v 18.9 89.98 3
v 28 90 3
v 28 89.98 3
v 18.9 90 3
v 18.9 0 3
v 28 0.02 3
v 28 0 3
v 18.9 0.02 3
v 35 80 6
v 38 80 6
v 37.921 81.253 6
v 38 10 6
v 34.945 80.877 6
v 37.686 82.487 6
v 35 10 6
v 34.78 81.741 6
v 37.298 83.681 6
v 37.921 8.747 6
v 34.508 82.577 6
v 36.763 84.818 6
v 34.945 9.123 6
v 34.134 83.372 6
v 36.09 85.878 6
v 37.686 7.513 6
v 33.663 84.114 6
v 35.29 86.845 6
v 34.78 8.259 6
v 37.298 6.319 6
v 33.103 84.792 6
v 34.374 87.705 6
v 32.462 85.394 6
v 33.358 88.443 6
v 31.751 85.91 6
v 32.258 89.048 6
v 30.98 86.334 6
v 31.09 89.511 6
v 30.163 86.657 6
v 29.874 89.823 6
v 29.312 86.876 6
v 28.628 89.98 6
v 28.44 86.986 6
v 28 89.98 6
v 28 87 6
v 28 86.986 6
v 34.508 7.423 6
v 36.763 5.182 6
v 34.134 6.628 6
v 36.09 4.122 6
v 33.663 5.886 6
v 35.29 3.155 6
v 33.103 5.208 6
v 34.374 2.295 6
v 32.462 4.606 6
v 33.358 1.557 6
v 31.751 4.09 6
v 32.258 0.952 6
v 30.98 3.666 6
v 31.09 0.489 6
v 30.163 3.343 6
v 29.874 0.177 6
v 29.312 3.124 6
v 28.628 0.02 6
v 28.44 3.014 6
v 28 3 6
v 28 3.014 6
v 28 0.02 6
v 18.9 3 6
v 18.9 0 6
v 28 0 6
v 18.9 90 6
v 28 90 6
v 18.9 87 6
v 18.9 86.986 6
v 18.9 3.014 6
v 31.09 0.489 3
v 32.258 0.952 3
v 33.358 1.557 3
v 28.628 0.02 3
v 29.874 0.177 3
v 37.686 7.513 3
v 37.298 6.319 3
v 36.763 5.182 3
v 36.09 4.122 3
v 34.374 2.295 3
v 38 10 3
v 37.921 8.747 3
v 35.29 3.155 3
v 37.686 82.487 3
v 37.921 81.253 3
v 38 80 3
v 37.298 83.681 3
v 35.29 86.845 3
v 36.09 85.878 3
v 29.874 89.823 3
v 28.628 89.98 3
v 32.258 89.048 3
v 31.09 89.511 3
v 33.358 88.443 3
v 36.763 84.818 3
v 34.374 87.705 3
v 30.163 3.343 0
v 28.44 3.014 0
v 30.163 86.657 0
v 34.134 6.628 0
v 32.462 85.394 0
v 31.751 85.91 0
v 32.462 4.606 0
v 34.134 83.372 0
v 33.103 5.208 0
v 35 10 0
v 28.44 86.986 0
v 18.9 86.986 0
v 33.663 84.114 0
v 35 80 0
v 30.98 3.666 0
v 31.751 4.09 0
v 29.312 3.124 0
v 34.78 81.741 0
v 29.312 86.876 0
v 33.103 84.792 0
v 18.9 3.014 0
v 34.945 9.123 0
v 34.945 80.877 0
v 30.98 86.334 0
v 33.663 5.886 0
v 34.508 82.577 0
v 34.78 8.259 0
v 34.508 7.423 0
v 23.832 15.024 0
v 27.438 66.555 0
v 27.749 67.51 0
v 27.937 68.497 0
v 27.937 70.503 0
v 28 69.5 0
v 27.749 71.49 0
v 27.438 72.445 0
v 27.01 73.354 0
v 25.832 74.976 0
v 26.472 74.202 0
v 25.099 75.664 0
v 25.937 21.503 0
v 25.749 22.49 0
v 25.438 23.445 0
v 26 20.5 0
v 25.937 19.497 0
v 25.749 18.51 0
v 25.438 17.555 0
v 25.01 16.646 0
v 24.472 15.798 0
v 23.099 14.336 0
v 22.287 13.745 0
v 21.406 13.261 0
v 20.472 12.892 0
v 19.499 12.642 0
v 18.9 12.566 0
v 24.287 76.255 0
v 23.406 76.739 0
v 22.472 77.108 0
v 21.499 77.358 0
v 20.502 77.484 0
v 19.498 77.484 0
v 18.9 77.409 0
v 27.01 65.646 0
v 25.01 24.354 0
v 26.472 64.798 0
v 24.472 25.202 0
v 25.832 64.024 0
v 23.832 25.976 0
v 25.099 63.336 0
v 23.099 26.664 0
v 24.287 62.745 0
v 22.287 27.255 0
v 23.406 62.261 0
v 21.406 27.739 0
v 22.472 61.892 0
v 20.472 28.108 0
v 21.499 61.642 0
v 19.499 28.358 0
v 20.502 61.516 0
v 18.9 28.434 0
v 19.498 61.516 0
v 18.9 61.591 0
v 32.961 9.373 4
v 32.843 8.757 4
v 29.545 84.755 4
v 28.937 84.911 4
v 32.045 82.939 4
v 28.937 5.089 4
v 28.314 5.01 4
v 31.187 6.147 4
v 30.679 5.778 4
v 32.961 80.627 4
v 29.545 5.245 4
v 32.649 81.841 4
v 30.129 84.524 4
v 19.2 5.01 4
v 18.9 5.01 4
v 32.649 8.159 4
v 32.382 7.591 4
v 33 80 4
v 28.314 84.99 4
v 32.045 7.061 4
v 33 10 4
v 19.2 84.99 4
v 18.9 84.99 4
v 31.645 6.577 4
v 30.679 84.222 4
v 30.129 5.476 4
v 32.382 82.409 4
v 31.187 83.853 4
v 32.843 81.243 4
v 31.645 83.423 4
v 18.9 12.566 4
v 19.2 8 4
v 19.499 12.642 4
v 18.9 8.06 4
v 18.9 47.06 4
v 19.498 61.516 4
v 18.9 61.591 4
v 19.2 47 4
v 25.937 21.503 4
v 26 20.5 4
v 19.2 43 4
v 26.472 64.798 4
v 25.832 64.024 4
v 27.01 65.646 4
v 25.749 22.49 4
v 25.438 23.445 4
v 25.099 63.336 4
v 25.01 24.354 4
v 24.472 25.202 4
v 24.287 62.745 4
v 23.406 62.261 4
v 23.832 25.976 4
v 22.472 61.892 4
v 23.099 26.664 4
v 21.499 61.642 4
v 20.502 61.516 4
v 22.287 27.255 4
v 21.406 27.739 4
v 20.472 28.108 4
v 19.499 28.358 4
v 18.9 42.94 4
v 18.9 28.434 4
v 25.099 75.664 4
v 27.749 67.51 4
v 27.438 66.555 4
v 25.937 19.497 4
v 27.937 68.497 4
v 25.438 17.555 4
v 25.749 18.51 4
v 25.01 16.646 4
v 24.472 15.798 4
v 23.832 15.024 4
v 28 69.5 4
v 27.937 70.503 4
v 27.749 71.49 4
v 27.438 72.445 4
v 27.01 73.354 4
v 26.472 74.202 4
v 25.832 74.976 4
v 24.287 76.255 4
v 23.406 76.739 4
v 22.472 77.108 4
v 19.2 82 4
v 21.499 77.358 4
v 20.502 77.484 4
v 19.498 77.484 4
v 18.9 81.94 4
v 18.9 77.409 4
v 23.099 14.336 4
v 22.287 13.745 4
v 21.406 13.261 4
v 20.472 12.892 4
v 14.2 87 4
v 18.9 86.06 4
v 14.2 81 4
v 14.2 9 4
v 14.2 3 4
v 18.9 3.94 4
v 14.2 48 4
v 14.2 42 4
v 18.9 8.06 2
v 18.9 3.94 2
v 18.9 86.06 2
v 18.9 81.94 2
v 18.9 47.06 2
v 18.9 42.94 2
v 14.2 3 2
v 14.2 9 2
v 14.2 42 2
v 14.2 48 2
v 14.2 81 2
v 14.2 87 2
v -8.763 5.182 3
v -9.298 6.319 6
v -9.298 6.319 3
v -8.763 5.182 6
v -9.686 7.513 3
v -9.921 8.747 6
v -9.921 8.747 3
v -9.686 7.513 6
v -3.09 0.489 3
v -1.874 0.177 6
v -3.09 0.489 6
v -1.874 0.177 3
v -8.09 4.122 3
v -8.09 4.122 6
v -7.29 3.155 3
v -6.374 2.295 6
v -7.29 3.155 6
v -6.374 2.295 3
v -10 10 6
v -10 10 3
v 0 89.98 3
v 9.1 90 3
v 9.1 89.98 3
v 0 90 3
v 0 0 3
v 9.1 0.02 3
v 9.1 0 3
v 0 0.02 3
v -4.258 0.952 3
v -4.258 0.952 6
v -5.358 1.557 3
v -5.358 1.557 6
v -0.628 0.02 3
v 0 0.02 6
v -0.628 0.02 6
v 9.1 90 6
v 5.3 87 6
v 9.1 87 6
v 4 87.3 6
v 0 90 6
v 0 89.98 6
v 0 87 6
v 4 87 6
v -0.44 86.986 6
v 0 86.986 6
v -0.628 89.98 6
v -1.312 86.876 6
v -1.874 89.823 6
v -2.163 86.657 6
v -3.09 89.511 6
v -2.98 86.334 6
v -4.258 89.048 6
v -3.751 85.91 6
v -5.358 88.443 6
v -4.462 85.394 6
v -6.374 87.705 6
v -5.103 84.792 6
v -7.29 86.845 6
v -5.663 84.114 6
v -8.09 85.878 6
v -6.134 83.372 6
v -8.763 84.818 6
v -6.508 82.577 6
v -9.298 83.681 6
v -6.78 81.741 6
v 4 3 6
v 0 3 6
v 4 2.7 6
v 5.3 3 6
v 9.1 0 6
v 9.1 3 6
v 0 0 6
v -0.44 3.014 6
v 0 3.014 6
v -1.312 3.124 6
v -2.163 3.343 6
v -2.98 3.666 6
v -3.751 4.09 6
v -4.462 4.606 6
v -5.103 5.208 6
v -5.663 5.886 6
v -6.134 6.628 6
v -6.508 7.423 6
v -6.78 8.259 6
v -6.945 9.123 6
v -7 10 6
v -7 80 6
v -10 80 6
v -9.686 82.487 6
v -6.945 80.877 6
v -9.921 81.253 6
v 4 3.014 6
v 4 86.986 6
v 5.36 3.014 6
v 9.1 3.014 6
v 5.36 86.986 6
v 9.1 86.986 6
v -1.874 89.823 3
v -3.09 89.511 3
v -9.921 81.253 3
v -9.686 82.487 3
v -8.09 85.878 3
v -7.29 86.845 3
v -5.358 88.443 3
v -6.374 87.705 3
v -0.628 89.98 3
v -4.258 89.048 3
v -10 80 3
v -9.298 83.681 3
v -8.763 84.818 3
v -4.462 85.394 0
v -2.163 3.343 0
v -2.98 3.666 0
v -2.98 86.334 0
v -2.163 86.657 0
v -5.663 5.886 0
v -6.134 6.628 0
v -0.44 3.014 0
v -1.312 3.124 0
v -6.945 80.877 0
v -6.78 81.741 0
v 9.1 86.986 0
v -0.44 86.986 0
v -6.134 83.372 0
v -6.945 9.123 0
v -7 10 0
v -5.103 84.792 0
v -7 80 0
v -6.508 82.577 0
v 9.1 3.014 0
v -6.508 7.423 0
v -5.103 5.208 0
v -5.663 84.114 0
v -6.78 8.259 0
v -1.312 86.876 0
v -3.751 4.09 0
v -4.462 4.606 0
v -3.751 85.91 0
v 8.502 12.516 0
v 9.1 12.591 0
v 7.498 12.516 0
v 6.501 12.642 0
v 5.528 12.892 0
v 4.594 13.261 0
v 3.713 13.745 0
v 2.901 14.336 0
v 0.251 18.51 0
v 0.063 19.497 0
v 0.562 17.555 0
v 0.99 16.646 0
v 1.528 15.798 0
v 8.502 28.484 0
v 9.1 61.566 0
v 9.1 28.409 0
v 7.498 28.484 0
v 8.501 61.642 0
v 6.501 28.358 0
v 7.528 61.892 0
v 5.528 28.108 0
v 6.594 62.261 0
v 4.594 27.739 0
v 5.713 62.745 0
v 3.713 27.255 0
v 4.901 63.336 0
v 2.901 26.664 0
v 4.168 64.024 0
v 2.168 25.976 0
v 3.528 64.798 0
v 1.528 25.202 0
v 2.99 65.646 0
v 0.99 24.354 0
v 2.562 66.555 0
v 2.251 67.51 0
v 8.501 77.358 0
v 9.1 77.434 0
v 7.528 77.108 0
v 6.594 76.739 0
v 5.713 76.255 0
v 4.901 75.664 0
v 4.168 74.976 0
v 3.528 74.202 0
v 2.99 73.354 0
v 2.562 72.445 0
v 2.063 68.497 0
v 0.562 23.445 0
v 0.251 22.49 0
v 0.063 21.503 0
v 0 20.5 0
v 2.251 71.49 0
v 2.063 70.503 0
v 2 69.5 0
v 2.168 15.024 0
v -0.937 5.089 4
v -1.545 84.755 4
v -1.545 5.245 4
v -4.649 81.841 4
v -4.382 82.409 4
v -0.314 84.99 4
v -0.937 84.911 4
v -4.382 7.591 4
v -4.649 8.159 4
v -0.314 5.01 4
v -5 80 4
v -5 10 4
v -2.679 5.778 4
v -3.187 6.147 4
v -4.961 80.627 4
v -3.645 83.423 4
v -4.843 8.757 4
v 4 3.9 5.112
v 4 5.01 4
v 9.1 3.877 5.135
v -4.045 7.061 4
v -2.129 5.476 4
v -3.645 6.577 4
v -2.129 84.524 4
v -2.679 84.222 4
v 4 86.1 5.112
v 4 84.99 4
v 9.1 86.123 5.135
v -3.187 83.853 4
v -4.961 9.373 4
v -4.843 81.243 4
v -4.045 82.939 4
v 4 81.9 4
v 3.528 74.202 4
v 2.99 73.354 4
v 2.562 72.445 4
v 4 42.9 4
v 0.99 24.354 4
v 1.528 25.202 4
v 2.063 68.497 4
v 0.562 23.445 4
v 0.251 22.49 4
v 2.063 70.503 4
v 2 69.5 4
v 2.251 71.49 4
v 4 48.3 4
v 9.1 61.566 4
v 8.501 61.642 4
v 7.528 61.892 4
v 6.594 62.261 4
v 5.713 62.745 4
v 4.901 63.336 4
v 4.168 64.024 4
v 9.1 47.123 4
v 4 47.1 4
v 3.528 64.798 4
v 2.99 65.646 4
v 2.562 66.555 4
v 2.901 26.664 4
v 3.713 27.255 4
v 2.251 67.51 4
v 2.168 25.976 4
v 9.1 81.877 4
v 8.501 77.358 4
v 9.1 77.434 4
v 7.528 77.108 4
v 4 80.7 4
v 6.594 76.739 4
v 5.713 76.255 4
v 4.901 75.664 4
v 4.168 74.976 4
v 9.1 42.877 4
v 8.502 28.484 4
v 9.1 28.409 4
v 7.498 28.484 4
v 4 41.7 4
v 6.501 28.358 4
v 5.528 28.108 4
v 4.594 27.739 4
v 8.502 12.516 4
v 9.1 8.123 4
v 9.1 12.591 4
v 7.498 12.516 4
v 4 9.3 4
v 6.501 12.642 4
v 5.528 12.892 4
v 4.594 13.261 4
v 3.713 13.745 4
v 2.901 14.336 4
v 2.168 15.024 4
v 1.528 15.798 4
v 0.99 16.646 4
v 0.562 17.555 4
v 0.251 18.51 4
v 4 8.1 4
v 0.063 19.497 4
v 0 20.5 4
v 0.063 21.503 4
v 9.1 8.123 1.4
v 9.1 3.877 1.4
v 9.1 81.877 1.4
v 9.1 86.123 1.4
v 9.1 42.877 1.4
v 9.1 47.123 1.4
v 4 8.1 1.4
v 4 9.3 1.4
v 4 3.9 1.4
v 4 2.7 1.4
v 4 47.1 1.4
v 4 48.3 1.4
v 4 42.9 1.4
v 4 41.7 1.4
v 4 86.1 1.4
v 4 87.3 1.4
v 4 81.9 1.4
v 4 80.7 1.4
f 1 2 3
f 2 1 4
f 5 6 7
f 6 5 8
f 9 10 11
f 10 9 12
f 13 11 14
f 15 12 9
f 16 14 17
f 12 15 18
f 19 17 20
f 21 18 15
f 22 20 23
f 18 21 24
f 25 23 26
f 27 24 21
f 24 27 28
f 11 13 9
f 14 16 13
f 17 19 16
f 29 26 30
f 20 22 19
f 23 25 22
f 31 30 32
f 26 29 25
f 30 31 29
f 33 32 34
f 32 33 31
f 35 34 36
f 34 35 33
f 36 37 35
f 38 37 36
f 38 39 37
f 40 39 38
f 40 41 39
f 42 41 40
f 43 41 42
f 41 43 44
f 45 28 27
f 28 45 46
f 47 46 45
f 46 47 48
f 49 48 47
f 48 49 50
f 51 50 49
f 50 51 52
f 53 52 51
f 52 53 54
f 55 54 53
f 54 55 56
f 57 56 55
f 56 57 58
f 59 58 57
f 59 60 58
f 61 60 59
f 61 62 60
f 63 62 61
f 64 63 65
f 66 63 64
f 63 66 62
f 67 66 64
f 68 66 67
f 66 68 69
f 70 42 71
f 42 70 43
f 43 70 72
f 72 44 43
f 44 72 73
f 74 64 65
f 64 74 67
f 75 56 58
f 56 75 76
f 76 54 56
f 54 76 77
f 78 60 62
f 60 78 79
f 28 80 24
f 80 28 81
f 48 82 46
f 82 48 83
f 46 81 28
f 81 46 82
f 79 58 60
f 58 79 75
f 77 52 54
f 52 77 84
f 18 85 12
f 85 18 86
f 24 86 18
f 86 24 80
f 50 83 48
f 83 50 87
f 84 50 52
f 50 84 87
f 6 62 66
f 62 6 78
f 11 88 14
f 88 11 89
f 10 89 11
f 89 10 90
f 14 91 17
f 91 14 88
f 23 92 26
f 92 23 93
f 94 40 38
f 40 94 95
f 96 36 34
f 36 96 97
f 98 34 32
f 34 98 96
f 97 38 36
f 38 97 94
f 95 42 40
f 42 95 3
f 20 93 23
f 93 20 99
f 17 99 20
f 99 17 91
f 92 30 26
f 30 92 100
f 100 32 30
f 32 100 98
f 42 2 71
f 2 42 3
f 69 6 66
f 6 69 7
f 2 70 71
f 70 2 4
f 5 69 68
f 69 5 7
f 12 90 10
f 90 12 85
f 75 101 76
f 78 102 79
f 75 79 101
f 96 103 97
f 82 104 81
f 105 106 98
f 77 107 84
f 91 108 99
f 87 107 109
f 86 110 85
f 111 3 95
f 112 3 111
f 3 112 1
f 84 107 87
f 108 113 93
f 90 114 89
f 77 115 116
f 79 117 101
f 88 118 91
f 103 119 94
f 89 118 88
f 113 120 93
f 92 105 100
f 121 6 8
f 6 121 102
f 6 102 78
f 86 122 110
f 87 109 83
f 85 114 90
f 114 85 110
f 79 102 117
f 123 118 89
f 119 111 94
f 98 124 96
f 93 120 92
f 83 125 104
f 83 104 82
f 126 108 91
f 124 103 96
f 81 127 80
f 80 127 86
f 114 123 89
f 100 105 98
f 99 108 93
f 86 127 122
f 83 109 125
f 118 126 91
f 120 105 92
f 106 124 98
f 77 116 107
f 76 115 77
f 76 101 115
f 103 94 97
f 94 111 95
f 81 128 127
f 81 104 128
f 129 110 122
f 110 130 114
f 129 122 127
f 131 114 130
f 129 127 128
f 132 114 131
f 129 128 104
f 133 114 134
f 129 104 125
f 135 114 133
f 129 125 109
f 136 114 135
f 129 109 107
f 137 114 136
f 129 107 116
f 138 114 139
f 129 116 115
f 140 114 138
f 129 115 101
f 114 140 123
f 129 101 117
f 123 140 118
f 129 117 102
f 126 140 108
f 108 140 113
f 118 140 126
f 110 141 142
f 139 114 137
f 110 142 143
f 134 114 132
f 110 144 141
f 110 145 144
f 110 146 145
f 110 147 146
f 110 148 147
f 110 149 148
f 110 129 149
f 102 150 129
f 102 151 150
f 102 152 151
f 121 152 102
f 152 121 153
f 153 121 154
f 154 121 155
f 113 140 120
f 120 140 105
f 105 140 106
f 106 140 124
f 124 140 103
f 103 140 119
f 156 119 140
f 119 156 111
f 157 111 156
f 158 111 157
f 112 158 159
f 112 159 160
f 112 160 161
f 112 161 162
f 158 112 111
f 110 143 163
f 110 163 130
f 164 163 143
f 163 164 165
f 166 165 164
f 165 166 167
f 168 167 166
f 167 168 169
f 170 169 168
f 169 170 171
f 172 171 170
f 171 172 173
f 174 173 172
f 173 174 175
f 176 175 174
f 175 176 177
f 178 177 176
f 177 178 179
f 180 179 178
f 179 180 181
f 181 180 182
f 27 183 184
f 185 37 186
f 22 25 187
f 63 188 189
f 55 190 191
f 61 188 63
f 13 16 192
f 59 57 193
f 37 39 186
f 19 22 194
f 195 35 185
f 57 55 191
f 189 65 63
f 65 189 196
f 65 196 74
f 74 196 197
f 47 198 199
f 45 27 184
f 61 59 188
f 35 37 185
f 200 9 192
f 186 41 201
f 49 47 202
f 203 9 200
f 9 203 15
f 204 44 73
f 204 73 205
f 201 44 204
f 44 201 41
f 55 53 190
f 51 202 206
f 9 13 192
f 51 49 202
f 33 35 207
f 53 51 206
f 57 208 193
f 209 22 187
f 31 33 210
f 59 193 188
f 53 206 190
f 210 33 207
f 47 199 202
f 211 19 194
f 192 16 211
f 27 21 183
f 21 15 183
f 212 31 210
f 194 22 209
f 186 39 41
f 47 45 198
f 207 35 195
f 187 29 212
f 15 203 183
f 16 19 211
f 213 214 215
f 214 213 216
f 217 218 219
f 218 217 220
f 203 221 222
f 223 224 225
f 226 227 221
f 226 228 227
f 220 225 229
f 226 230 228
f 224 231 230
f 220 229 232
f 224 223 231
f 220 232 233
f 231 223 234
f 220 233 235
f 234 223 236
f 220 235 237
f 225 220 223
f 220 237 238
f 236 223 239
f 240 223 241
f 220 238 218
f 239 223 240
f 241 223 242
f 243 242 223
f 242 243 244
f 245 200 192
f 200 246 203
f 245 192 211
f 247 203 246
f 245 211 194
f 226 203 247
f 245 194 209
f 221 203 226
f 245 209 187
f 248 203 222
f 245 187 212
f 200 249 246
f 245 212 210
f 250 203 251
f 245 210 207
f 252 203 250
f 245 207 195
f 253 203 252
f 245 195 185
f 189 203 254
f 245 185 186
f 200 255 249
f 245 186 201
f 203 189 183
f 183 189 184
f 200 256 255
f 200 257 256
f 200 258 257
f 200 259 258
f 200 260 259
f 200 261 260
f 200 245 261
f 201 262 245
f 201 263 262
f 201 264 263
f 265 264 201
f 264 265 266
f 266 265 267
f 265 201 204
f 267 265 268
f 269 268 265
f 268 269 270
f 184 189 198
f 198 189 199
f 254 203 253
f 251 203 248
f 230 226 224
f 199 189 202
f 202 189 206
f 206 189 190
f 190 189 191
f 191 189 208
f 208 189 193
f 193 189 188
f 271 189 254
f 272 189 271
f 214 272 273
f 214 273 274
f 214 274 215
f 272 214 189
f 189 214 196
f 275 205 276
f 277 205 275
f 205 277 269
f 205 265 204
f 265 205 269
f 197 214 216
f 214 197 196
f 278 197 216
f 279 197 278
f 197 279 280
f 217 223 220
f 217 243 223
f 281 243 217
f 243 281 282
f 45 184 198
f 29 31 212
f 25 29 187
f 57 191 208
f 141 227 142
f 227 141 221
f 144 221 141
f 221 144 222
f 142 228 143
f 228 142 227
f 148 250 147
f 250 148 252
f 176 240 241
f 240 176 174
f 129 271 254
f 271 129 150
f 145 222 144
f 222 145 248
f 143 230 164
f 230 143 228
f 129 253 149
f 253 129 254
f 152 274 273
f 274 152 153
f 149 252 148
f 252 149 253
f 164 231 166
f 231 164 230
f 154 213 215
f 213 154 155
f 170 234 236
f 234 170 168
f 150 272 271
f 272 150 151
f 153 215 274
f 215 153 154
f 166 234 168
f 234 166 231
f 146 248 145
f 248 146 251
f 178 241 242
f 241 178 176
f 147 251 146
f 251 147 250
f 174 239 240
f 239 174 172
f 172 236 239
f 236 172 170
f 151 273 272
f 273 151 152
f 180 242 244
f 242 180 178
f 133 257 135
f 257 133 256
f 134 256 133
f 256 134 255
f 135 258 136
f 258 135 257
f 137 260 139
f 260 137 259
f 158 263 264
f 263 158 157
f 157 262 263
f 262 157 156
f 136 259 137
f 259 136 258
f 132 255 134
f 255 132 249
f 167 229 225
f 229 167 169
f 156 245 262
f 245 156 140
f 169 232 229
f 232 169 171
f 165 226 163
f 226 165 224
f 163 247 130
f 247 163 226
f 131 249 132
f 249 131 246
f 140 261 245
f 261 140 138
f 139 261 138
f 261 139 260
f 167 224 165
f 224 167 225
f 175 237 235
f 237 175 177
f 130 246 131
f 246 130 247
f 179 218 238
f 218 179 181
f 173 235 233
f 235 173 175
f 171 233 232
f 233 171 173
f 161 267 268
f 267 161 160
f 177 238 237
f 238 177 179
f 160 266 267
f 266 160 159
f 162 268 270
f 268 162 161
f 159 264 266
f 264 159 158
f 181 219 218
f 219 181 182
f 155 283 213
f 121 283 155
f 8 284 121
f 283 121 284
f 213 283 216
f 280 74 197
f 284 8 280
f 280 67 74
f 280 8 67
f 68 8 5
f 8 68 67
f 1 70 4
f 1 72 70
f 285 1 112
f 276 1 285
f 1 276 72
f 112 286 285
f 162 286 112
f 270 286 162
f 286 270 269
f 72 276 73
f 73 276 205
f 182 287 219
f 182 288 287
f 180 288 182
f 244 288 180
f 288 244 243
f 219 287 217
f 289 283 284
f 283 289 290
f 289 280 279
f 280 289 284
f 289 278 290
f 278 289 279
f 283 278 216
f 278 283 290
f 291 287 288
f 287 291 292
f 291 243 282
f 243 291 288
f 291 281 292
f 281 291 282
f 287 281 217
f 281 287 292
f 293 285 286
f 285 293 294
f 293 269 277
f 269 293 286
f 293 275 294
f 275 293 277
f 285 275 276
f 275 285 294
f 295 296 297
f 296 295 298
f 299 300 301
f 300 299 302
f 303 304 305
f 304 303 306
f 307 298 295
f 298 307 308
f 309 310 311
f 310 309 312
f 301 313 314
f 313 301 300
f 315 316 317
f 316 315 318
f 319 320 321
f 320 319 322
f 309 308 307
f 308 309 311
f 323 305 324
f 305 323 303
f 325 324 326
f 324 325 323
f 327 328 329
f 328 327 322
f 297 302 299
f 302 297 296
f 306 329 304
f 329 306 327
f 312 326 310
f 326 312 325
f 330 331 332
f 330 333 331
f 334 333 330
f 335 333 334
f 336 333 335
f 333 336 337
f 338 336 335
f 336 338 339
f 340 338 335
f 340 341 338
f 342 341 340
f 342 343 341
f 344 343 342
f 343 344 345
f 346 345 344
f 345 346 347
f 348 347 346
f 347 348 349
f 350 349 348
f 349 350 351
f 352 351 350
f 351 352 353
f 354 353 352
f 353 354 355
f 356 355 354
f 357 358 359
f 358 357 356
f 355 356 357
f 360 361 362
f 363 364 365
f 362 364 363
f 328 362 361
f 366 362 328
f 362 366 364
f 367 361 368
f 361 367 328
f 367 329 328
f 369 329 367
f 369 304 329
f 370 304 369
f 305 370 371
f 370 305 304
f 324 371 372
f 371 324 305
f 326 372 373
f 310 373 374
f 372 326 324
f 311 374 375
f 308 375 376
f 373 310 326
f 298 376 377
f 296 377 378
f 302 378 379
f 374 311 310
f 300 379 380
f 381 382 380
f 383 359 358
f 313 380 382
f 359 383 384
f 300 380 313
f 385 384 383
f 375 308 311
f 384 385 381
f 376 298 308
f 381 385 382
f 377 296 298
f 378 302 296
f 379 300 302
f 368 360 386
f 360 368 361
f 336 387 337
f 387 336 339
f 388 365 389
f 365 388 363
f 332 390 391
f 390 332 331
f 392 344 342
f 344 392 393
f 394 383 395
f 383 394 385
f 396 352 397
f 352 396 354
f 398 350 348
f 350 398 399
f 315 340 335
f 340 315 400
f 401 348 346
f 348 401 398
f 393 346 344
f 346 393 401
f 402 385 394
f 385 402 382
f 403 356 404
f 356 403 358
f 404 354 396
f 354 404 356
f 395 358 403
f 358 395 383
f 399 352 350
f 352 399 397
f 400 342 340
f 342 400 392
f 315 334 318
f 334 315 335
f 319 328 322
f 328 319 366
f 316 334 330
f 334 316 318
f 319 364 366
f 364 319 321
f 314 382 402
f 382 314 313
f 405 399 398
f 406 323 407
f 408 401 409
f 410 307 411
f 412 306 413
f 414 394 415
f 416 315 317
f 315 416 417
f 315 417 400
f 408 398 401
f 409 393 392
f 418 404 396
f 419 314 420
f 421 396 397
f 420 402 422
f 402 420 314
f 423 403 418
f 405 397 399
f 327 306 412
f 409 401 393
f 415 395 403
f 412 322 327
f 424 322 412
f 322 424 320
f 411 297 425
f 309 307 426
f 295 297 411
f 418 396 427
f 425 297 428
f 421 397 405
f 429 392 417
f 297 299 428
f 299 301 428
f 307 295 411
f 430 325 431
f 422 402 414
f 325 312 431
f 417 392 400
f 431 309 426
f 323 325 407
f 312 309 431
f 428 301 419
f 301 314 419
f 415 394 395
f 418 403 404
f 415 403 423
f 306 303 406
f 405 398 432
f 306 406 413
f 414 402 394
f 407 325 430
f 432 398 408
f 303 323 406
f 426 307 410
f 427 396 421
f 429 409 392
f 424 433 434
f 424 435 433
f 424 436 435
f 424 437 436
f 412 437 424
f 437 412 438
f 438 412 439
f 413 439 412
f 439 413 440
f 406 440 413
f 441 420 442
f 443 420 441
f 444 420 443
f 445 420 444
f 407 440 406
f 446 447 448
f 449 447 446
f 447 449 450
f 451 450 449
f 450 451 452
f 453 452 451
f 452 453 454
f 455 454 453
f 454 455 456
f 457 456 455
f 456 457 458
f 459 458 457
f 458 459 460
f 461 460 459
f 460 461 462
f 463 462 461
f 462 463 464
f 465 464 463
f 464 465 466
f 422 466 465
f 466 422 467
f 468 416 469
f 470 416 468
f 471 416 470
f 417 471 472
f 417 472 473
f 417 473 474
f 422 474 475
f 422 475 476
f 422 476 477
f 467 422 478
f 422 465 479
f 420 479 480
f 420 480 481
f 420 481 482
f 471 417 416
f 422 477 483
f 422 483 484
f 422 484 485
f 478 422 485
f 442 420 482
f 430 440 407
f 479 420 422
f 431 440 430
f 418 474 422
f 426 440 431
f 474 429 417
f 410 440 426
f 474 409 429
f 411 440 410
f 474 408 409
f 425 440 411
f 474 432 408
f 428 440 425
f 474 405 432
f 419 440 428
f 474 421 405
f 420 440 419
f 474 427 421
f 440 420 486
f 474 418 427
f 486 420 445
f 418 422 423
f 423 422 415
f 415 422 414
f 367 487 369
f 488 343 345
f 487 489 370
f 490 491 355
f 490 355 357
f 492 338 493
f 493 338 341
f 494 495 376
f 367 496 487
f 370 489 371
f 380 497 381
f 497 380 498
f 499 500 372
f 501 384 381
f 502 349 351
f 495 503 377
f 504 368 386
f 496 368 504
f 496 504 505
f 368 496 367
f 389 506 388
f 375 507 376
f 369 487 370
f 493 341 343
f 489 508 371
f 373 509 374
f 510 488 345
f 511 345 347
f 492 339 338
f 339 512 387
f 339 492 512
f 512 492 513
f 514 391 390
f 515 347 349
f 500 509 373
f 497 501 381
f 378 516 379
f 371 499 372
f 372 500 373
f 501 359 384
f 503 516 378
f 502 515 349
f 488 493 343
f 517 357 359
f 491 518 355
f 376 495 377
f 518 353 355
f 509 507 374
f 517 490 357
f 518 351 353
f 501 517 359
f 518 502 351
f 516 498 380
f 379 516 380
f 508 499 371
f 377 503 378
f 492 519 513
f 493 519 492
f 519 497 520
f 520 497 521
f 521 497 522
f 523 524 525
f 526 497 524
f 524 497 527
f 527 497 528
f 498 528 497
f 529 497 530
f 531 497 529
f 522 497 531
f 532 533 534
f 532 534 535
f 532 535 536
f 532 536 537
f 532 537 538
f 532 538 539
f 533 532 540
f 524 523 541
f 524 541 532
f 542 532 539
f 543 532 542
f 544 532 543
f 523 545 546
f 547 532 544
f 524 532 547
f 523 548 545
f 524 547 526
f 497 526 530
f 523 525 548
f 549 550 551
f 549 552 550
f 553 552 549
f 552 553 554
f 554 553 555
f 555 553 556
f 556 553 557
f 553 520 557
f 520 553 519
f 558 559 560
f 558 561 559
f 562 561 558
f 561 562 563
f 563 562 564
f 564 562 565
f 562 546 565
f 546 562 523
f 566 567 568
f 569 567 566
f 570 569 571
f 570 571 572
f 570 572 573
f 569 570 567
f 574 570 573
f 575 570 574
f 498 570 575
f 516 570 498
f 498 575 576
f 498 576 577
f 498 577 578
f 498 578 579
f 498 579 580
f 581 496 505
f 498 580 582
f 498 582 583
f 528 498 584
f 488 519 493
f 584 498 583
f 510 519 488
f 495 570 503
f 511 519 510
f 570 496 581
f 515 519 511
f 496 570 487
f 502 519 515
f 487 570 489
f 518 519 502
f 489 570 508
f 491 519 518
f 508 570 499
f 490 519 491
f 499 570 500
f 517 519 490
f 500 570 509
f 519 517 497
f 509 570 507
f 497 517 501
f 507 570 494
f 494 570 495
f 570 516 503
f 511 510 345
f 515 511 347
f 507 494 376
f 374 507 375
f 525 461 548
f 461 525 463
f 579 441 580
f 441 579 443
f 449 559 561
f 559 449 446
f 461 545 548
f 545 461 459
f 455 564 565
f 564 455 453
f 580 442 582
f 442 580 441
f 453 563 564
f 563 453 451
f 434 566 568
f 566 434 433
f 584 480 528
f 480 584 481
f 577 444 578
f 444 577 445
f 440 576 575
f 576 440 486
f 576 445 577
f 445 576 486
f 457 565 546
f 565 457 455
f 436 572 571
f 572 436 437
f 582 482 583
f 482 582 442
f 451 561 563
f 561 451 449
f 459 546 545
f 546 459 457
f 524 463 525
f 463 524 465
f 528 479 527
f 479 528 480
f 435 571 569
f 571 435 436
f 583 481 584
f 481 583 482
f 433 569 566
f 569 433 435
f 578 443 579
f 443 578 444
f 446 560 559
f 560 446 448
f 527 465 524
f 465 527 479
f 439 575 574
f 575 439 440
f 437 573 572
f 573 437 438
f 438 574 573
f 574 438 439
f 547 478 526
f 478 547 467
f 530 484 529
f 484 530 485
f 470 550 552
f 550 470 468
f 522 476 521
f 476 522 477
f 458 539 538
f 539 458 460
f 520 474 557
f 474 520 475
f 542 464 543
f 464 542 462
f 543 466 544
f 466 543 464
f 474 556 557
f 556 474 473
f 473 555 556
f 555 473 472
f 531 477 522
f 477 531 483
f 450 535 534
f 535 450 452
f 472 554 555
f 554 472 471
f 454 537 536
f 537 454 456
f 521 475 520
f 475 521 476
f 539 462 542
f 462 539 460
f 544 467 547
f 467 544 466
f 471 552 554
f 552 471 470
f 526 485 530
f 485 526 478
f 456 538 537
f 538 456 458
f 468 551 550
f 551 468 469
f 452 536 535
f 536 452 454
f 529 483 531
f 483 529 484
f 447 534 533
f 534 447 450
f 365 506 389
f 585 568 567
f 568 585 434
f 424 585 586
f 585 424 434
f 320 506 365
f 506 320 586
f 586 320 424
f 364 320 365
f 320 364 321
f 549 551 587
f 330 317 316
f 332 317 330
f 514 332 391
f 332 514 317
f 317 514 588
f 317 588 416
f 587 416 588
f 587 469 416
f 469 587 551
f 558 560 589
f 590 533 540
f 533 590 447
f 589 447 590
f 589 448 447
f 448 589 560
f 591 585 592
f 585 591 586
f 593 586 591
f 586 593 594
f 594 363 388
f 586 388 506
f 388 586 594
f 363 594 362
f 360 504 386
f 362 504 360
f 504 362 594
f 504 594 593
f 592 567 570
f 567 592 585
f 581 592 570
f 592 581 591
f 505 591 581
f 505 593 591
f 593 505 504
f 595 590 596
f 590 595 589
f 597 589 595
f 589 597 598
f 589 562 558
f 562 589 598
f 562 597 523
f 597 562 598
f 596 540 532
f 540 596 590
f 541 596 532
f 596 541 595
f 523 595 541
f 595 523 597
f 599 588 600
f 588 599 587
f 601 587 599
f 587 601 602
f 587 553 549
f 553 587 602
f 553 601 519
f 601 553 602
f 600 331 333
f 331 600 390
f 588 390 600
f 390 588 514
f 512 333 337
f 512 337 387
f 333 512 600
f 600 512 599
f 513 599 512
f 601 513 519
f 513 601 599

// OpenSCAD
// file: kitchen_config.scad
use <./_cfg.scad>

// Kitchen Configuration Functions
function get_h() = 6;
function get_width() = 38;
function get_length() = 90;
function get_diameter() = 16;
function get_distance() = 49;
function get_nutDistance() = 6;
function get_separation() = 10;
function get_offset_l() = -1;
function get_offset_r() = 1;
// file: _cfg.scad
// Global configuration functions
function get_fn() = 50;
function get_darft() = false;
// file: base.scad
module base(h, width, length, diameter, distance, offset_l=0, offset_r=0, fn) {
    corner_radius=10;

    difference() {
        union() {
            difference() {
                _base_plate_shape(corner_radius, h, width, length, fn);
                translate([3,3,h-2]) {
                    offset=3;
                    _base_plate_shape(corner_radius-offset, h-2, width-offset*2, length-offset*2, fn);
                }
            }
        }

        translate([width/2, length/2-distance/2, -.1]) {
            translate([offset_l, 0, 0])
            cylinder(d=diameter, h=h+.2, center=false, $fn=fn);
            translate([offset_r, distance, 0]) {
                cylinder(d=diameter, h=h+.2, center=false, $fn=fn);
            }
        }
    }
}

module rounded_top_only(corner_radius, h, width, length, fn) {
    minkowski() {
        _base_plate_shape(corner_radius, h - corner_radius, width, length, fn);
        translate([0, 0, corner_radius]) cylinder(r=corner_radius/2, h=0.001, $fn=fn);
    }
}

module _base_plate_shape(corner_radius, h, width, length, fn) {
    hs=h/2;
    hn=h-hs;

    translate([0, 0, hs])

    union() {
        translate([corner_radius, 0, 0])
            cube([width - corner_radius * 2, length, hn], center=false);

        translate([0, corner_radius, 0])
            cube([width, length - corner_radius * 2, hn], center=false);

        for (x = [corner_radius, width - corner_radius])
        for (y = [corner_radius, length - corner_radius])
        translate([x, y, 0])
            cylinder(d = corner_radius * 2, h = hn, center = false, $fn = fn);

        // -------

        hull() {
            for (x = [corner_radius, width - corner_radius])
            for (y = [corner_radius, length - corner_radius])
            translate([x, y, 0])
                translate([0, 0, -hs])
                    cylinder(r1=corner_radius-hs, r2=corner_radius, h = hs, center = false, $fn = fn);
        }
    }
}

module nut(h,extend=0) {
    nut_height=h;
    nut_width=5+extend;
    nut_length=4+extend;
    nut_length_=1+extend;
    rotate([0,0,90]) {
        translate([-nut_length/2,0,0]) {
            linear_extrude(height=nut_height)
                polygon(points=[[0,0], [-nut_length_,nut_width], [0,nut_width]]);

            translate([nut_length,0,0]) {
                linear_extrude(height=nut_height)
                    polygon(points=[[0,0], [nut_length_,nut_width], [0,nut_width]]);
            }

            cube([nut_length, nut_width, nut_height], center=false);
        }
    }
}

module both(h, width, length, diameter, distance, nutDistance, separation, offset_l=0, offset_r=0, fn) {
    left(h, width, length, diameter, distance, nutDistance, offset_l, offset_r, fn);

    translate([-separation, 0, 0])
        right(h, width, length, diameter, distance, nutDistance, offset_l, offset_r, fn);
}

module left(h, width, length, diameter, distance, nutDistance, offset_l=0, offset_r=0, fn) {
    union() {
        translate([0, 0, 0]) {
            difference() {
                base(h, width, length, diameter, distance, offset_l, offset_r, fn);
                translate([-.1, -.1, -.1]) {
                    cube([width / 2, length + .2, h + .2], center = false);
                }
            }
        }

        translate([0.2,0,2])
            translate([width / 2, 0, 0]) {
                translate([0, nutDistance, 0]) {
                    nut(h - 4);
                }
                translate([0, length / 2, 0]) {
                    nut(h - 4);
                }
                translate([0, length - nutDistance, 0]) {
                    nut(h - 4);
                }
            }
    }
}

module right(h, width, length, diameter, distance, nutDistance, offset_l=0, offset_r=0, fn) {
    difference() {
        union() {
            difference() {
                base(h, width, length, diameter, distance, offset_l, offset_r, fn);
                translate([width / 2 + .1, -.1, -.1]) {
                    cube([width / 2, length + .2, h + .2], center = false);
                }
            }
        }

        translate([0.2,0,1.5])
            translate([width / 2 , 0, -.1]) {
                translate([0, nutDistance, 0]) {
                    nut(h - 1.3, extend = .2);
                }
                translate([0, length / 2, 0]) {
                    nut(h - 1.3, extend = .2);
                }
                translate([0, length - nutDistance, 0]) {
                    nut(h - 1.3, extend =  .2);
                }
            }
    }
}
// main file
use <./base.scad>
use <./_cfg.scad>
use <./kitchen_config.scad>

both(
    h=get_h(),
    width=get_width(),
    length=get_length(),
    diameter=get_diameter(),
    distance=get_distance(),
    nutDistance=get_nutDistance(),
    separation=get_separation(),
    offset_l=get_offset_l(),
    offset_r=get_offset_r(),
    fn=get_fn()
);
